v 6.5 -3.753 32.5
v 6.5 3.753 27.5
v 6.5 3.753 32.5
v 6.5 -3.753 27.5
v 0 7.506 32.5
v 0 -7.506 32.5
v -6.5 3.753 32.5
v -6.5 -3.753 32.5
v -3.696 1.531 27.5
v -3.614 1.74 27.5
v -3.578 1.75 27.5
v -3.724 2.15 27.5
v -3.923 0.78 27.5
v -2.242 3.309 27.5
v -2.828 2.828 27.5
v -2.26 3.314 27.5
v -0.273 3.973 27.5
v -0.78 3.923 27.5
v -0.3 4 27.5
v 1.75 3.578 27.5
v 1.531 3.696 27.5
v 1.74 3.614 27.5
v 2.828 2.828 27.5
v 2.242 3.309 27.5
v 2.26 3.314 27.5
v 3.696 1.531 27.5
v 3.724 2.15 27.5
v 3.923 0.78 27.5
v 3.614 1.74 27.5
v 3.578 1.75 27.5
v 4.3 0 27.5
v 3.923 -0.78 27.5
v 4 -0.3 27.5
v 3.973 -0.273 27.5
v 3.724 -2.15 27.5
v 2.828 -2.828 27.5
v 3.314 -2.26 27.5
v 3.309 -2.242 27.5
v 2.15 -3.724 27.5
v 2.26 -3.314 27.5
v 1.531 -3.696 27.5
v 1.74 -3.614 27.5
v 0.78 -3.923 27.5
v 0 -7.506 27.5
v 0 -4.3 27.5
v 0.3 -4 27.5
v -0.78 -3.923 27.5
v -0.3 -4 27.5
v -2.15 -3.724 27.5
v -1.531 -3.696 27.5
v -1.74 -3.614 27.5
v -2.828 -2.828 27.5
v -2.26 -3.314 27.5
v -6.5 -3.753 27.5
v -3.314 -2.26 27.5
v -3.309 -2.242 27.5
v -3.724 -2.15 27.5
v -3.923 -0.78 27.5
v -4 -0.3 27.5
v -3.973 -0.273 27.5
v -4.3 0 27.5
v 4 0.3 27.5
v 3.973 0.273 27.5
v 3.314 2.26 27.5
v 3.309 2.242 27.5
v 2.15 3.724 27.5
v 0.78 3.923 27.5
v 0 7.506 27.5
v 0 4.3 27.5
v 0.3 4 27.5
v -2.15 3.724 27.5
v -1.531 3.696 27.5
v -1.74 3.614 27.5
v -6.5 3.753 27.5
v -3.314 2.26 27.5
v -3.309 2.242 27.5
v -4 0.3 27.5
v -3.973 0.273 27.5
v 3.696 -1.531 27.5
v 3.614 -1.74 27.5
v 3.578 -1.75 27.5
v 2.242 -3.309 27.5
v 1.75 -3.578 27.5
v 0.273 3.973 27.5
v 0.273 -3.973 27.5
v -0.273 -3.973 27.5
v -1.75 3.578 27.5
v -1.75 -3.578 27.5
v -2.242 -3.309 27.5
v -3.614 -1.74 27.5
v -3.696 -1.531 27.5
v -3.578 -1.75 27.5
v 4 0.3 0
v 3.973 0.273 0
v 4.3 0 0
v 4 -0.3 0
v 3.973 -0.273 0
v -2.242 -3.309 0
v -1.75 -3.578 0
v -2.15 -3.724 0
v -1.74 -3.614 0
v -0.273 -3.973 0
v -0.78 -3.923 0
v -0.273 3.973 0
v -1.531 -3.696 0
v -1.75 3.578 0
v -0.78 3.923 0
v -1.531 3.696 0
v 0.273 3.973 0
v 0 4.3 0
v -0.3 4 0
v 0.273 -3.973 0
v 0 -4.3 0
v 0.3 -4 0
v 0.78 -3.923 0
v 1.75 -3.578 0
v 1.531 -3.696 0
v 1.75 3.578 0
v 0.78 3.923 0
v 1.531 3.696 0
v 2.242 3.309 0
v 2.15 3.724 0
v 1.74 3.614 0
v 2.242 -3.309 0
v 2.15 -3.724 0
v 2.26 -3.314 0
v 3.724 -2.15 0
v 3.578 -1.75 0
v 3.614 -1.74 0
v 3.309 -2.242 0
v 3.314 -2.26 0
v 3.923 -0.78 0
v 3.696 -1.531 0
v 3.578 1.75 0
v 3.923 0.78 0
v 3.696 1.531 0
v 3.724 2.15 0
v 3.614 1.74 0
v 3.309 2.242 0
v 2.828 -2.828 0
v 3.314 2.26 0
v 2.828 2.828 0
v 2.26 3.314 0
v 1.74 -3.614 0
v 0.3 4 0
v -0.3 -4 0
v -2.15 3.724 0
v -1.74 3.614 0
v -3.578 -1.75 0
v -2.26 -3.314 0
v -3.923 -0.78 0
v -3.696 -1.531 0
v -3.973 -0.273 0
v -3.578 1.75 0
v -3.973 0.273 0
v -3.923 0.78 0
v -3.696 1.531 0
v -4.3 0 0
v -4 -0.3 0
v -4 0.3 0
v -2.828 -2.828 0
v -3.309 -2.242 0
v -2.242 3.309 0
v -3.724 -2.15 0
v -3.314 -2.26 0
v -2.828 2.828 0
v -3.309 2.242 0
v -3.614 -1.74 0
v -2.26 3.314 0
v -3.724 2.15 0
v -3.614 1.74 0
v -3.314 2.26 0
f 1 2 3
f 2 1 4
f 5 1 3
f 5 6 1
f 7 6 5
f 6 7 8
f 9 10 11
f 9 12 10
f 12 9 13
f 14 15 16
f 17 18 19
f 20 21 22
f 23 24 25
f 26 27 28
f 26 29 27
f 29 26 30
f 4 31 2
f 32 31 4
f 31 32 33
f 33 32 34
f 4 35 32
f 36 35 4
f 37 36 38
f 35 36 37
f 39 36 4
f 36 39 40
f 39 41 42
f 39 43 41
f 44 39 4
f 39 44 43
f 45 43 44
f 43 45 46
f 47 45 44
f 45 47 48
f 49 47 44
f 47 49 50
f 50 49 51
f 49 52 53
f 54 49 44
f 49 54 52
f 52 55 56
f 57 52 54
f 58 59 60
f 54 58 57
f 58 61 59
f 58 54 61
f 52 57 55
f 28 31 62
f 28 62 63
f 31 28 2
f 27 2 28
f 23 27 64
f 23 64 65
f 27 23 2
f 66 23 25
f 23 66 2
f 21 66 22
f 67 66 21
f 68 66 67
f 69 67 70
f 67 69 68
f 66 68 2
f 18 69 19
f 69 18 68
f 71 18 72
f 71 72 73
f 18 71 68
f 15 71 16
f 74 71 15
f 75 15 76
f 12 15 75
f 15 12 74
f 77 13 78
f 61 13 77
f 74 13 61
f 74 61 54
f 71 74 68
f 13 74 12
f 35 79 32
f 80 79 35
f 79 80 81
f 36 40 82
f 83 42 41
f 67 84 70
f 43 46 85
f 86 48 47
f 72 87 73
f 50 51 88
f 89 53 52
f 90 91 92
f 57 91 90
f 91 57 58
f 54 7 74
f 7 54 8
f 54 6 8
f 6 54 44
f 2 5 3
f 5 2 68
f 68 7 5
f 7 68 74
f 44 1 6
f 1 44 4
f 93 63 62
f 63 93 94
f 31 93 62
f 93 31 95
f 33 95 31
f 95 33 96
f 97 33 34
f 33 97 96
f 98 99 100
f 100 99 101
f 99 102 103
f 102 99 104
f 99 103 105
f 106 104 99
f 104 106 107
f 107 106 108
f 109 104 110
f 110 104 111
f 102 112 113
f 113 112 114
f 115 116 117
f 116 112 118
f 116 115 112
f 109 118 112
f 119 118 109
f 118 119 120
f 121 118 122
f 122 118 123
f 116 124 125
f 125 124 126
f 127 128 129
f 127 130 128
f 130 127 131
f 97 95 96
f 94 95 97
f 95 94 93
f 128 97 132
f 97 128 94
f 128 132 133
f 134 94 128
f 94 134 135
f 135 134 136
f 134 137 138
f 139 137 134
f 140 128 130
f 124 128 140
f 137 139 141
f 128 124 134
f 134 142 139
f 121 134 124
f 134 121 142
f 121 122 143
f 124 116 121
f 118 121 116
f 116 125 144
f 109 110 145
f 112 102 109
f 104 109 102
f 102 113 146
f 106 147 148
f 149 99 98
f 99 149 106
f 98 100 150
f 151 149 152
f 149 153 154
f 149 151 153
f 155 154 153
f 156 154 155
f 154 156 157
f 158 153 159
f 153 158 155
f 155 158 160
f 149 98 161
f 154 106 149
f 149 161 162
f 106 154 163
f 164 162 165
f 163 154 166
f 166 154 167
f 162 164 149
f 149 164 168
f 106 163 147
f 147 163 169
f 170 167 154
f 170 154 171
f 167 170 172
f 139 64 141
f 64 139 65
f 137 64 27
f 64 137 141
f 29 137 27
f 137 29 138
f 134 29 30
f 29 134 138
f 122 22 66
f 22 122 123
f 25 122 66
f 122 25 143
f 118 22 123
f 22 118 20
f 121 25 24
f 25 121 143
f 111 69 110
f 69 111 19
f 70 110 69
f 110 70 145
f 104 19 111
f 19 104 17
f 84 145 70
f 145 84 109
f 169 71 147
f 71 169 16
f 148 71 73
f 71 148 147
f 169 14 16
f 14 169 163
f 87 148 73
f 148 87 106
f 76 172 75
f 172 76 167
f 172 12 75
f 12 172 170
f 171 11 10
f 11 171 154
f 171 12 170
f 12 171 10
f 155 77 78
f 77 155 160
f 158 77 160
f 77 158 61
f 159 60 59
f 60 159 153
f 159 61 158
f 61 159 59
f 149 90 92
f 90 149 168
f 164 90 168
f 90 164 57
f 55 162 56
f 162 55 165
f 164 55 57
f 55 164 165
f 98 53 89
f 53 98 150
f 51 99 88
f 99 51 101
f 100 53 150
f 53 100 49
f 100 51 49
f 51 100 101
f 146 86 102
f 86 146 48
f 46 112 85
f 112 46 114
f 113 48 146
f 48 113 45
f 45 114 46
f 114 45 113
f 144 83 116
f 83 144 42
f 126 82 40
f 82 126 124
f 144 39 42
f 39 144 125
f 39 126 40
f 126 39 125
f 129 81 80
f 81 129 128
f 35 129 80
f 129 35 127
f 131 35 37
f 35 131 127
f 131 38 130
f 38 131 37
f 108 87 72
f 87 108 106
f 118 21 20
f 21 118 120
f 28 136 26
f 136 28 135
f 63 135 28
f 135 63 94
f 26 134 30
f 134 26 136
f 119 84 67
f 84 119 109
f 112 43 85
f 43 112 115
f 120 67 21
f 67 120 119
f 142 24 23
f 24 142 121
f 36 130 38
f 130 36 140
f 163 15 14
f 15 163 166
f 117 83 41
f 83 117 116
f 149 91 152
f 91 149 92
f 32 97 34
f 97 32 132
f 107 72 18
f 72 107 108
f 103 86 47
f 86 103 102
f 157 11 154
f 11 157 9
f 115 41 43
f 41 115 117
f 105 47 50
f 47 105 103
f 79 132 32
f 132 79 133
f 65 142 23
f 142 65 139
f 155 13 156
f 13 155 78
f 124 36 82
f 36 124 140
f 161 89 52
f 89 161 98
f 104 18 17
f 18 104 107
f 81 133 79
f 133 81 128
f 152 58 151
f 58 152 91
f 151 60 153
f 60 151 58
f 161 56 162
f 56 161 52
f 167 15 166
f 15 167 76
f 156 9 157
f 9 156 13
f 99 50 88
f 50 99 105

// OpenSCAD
// Parametric hex bolt — M8 x 30mm
// Demonstrates modules, for loops, and parametric design
// (For actual threads, use BOSL2: see examples/bosl2-rounded-box.scad)

$fn = 32;

bolt_diameter = 8;
bolt_length = 30;
head_height = 5;
hex_across_flats = 13;

module hex_head(across_flats, height) {
    // Regular hexagon from 3 rotated rectangles intersected
    intersection_for(i = [0:2]) {
        rotate([0, 0, 60 * i])
            cube([across_flats, across_flats * 2, height], center=true);
    }
}

module knurled_shaft(d, length, knurl_count=12, knurl_depth=0.3) {
    // Shaft with decorative knurl pattern using for-loop
    union() {
        cylinder(h=length, d=d);

        // Knurl ridges along the shaft
        for (i = [0 : knurl_count - 1])
            rotate([0, 0, i * 360 / knurl_count])
                translate([d/2, 0, 0])
                    cylinder(h=length, r=knurl_depth, $fn=4);
    }
}

module bolt(d, length, head_h, hex_af) {
    // Hex head
    translate([0, 0, length])
        hex_head(hex_af, head_h);

    // Shaft with chamfered tip
    union() {
        knurled_shaft(d, length);

        // Chamfer at tip
        cylinder(h=1.5, d1=d - 2, d2=d);
    }
}

bolt(
    d = bolt_diameter,
    length = bolt_length,
    head_h = head_height,
    hex_af = hex_across_flats
);
